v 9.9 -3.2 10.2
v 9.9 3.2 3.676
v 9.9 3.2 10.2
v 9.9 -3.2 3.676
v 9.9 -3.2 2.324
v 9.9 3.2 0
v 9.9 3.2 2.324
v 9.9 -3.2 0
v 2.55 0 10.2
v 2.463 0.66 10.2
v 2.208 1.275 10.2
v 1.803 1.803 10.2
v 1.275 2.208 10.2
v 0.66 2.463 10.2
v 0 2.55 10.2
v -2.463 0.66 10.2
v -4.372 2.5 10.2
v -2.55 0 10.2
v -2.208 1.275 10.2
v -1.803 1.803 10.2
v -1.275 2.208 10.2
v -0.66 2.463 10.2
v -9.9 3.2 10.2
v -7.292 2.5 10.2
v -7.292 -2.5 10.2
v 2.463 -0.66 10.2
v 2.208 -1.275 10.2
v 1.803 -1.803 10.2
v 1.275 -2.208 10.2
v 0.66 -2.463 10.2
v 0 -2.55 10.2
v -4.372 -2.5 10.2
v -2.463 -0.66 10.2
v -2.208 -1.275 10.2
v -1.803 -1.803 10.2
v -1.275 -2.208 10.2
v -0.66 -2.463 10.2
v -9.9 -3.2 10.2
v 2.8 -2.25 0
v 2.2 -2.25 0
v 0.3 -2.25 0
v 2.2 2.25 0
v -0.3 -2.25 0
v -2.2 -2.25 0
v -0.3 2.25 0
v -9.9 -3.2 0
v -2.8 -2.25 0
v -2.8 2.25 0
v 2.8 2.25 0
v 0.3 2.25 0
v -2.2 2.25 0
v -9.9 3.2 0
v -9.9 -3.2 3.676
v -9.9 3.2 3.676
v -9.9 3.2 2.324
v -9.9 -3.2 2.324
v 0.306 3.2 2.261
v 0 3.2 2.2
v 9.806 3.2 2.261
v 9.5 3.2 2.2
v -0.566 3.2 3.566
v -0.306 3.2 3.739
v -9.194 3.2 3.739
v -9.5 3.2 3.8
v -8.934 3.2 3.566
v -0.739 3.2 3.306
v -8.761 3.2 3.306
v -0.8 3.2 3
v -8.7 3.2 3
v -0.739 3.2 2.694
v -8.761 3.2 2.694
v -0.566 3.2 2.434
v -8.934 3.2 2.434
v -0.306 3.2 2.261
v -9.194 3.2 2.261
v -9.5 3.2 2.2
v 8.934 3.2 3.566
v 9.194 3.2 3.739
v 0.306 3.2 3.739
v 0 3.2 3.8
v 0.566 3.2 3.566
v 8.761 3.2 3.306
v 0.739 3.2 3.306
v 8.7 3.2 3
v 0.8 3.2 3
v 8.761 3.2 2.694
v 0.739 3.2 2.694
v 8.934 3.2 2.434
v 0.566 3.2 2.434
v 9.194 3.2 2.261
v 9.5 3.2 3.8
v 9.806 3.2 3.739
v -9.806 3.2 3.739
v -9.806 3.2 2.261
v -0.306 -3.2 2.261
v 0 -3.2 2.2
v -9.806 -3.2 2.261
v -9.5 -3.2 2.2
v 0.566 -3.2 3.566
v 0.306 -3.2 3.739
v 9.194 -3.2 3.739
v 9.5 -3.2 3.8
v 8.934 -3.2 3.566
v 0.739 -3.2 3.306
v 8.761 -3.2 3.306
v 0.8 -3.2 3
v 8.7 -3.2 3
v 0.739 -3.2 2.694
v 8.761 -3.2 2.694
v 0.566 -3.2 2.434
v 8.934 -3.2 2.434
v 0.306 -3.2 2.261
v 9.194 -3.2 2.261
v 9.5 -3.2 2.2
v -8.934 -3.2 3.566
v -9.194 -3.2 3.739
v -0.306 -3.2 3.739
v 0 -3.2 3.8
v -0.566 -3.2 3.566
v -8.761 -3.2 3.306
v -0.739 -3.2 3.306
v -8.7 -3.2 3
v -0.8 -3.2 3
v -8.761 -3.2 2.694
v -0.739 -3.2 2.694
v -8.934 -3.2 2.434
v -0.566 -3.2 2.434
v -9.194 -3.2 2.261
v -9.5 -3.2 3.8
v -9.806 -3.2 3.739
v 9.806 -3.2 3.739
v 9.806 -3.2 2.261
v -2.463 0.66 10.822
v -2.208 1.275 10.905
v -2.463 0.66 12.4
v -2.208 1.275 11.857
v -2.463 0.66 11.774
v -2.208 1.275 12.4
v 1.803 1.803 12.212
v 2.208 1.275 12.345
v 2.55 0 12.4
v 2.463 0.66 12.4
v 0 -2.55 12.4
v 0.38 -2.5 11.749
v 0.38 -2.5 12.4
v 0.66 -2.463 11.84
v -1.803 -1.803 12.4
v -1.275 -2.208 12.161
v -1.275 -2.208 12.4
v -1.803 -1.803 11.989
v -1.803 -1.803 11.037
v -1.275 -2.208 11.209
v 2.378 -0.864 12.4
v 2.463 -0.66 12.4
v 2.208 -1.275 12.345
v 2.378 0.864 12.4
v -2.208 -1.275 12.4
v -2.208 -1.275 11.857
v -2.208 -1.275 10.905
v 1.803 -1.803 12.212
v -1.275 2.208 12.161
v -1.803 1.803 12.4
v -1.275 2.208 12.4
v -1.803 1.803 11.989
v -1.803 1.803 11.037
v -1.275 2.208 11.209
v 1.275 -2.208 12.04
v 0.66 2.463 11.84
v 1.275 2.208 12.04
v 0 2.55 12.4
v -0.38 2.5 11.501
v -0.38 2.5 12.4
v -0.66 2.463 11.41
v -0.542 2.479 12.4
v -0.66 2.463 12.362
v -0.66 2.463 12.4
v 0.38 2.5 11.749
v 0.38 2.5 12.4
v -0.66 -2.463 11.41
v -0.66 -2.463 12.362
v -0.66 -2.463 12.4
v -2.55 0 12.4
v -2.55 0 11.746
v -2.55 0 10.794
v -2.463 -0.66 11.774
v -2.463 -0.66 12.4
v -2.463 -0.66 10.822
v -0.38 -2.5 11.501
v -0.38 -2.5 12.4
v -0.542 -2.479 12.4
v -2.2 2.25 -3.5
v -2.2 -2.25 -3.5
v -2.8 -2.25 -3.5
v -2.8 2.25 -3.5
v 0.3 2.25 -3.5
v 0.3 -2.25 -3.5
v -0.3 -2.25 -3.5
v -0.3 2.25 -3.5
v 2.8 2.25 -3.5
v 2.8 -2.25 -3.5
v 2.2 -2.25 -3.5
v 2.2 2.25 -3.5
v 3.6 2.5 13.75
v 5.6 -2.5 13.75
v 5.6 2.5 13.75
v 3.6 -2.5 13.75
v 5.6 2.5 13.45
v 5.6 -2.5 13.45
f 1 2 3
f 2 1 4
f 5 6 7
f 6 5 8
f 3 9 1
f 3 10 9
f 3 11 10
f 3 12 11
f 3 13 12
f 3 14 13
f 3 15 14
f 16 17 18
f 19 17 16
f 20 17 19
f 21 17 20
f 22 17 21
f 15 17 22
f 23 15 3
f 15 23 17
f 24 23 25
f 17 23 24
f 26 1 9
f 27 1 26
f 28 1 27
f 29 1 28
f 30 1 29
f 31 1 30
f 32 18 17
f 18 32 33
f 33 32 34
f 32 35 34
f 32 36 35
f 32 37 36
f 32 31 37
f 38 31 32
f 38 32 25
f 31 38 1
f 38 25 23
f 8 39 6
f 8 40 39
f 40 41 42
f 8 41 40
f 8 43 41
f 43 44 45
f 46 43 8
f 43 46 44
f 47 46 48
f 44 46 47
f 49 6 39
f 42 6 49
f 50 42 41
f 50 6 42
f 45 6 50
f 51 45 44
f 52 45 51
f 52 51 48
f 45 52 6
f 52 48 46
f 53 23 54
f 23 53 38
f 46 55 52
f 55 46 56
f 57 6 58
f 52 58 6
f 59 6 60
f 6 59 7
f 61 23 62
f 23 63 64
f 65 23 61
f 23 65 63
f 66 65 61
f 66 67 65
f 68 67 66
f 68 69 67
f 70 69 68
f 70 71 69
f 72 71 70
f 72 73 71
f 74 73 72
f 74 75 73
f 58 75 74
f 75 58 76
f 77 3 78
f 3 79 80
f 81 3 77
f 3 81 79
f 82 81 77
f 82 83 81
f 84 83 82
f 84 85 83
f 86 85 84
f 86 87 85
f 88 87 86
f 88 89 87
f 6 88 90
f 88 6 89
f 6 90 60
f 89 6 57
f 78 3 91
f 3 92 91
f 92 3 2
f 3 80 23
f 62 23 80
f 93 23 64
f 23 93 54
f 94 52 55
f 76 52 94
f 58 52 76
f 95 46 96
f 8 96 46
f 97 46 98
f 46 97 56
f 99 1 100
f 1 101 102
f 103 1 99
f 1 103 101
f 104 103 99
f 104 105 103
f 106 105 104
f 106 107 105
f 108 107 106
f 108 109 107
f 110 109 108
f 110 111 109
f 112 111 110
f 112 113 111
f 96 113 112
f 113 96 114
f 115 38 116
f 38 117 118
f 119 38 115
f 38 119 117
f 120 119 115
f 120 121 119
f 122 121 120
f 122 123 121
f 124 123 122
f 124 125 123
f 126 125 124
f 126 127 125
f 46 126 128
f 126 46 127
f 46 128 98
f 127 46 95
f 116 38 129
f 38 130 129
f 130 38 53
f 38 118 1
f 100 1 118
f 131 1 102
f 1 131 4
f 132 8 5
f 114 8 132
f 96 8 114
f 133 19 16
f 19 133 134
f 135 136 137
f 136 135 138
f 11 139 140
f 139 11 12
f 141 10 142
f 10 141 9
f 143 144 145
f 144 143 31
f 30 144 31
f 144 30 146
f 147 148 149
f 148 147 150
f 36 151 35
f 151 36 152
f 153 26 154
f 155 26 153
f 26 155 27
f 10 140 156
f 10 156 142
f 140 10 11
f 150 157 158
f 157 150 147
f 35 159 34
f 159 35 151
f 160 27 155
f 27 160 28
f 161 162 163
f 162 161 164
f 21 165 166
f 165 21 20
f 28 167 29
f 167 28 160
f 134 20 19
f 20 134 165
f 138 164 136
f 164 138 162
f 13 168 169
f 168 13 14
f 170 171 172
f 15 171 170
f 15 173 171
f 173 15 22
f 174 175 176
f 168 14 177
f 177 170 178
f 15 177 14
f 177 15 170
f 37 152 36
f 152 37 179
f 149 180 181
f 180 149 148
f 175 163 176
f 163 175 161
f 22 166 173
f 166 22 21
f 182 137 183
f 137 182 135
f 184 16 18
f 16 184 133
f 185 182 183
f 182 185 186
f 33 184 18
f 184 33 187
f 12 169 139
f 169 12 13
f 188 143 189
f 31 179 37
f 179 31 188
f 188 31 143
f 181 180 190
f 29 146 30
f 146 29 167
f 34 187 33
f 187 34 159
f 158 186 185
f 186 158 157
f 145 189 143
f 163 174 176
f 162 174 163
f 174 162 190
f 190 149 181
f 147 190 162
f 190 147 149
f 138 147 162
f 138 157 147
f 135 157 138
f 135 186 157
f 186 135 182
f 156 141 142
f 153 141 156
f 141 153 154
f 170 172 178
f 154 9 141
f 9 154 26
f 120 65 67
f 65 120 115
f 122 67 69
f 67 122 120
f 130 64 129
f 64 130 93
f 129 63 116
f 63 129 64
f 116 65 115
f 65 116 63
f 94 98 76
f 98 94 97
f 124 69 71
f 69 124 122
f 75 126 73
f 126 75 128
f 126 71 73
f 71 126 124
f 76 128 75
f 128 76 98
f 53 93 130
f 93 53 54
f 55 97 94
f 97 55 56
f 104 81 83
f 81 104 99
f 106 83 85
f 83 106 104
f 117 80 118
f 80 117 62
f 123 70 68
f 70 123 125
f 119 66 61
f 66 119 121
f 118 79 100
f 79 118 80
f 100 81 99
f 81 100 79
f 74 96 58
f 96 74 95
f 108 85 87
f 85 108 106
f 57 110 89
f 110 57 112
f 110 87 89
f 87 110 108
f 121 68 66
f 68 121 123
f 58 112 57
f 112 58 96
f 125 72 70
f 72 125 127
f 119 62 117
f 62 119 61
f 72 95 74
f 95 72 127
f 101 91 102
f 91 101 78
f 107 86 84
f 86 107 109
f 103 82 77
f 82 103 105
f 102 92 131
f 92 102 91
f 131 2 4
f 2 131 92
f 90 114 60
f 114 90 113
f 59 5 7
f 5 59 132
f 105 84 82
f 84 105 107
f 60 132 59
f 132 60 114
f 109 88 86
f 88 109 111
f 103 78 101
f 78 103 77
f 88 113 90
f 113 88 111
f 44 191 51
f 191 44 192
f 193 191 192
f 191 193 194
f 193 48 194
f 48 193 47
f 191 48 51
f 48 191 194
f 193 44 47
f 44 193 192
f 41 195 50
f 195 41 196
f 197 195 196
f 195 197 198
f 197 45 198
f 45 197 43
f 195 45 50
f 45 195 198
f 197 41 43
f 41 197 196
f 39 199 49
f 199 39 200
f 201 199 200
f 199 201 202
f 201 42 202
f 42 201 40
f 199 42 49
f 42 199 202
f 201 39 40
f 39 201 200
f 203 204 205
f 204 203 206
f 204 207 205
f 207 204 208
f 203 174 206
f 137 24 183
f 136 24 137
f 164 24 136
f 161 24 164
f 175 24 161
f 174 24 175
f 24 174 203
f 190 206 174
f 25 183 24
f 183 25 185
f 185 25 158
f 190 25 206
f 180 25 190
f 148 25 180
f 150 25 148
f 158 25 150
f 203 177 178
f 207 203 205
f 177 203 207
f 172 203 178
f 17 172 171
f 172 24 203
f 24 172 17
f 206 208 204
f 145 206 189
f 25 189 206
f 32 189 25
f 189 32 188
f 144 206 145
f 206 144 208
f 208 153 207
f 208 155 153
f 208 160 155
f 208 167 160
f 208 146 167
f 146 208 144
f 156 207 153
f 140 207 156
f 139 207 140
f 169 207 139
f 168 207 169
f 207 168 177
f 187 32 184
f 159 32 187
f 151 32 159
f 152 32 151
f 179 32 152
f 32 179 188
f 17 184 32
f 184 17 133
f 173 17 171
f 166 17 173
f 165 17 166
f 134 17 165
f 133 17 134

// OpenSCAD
// Bumper / Tower Micro Switch — SS-5GL-class SPDT snap-action switch
// ===========================================================================
//
// Parametric clearance/interfacing model of the subminiature SPDT snap-action
// micro switch used as the OOMWOO LiDAR-tower bumper sensor and front-bumper
// contact sensor.
//
// BOM identity (verify against the actual unit before relying on fit):
//   BOM.md row "LiDAR tower bumper sensor | 4 | $0.70 | Micro switches | SPDT
//   or similar" and row "Bumper switches | 2 | $0 | Included in cliff sensors
//   bundle". The BOM does NOT name a part number; the class of part is a
//   subminiature SPDT snap-action switch with lever actuator.
//
// Dimension basis: OMRON SS series datasheet "en-ss.pdf" (fetched 2026-08-09,
// https://omronfs.omron.com/en_US/ecb/products/pdf/en-ss.pdf), page 5, the
// "Hinge lever" outline drawing and operating-characteristics table (SS-5GL).
// The SS-5 family is THE widely used subminiature snap-action switch form
// factor (identical to the common 3D-printer end-stop switches) and is the
// representative geometry for this BOM class. Marked (datasheet:) means read
// from that drawing; marked (estimate) means inferred. The $0.70 AliExpress
// part is NOT guaranteed to be an Omron — caliper-verify against MEASURE-ME.md
// §15 before finalizing any mount.
//
// Cross-axis convention: switch body length runs along X, width along Y,
// height along Z. Origin at bottom-centre of the switch body, plunger side up.
//
// STATUS: DRAFT — datasheet-grounded envelope, caliper verification required.
//
// License: CC BY-SA 4.0

$fn = 48;

/* [Dimensions — EDIT TO MATCH YOUR MEASURED PART] */

// --- Body envelope (datasheet: en-ss.pdf p.5 hinge-lever outline) ---
// Overall body length / width / height.
body_l = 19.8;   // (datasheet: 19.8 dimension on hinge-lever outline)
body_w =  6.4;   // (datasheet: 6.4 dimensions on outline)
body_h = 10.2;   // (datasheet: 10.2 dimension on outline; incl. plunger guide)

// --- Mounting holes ---
// Datasheet drawing shows through-holes in the body for M1.6-class screws.
// Text on drawing: "3-1.6 dia. holes" with a "9.5±0.1" spacing callout.
// NOTE: hole pattern needs caliper verification — the drawing text extraction
// is ambiguous about which radius applies where (1.6 vs 2.35 callouts).
mtg_hole_dia   = 1.6;   // (datasheet: "3-1.6 dia. holes")
mtg_hole_count = 3;     // (datasheet: "3-1.6 dia. holes")
mtg_hole_pitch = 9.5;   // (datasheet: "9.5±0.1" spacing callout on outline)
mtg_hole_z     = 3.0;   // (estimate) hole axis height above mounting face

// --- Plunger / actuator ---
// Centre plunger that the lever presses on. (datasheet: "2.5±0.07 dia." on
// drawing = plunger OD at top of body).
plunger_dia  = 2.5;    // (datasheet: "2.5±0.07 dia.")
plunger_travel = 0.6;  // (estimate) class-of-part pretravel; datasheet SS-5GL
                       // OT min 1.0mm, MD max; plunger stroke is small

// --- Lever (hinge lever, SS-5GL style) ---
// The datasheet hinge-lever outline shows a stainless-steel leaf lever
// ("t=0.3*  * Stainless-steel lever") mounted at one end of the body top.
lever_style     = 1;   // 0 = no lever (pin plunger), 1 = hinge lever
lever_mat_t     = 0.3; // (datasheet: "t=0.3" lever sheet thickness)
lever_w         = 5.0; // (estimate) lever width; sheet narrower than body
lever_reach     = 14.5;// (datasheet: 14.5 lever reach dimension on outline)
// Free position = lever tip rest height above mounting reference plane.
// (datasheet operating characteristics: SS-5GL FP max 13.6 mm, OP 8.8±0.8 mm;
// used for tower/bumper clearance design).
lever_fp_z      = 13.6;  // (datasheet: SS-5GL "FP Max." = 13.6 mm)
lever_op_z      =  8.8;  // (datasheet: SS-5GL "OP" = 8.8±0.8 mm)
// Hinge pivot height above body base.
lever_hinge_z   = body_h - 1.0; // (estimate)

// --- Terminals (solder terminals, SPDT: C / NO / NC) ---
// Datasheet outline labels the three terminals C, NO, NC. Pin geometry is not
// dimensioned in the fetched section -> estimate, caliper verify.
term_count   = 3;      // (datasheet: C / NO / NC labels on outline)
term_pitch   = 2.5;    // (estimate) pin-to-pin pitch
term_len     = 3.5;    // (estimate) length below body base
term_w       = 0.6;    // (estimate) pin thickness
term_depth   = 4.5;    // (estimate) pin depth into body (Y direction)

// --- Render controls ---
show_terminals = true;  // set false to hide pins (clearer mount test)

// ===== MODULES =====

// Solid body block (no holes)
module solid_body() {
    translate([-body_l/2, -body_w/2, 0])
        cube([body_l, body_w, body_h]);
    // Plunger-guide boss around the plunger on top face
    translate([0, 0, body_h])
        cylinder(d=plunger_dia + 2.6, h=2.2, $fn=24);
}

// Mounting through-holes (drilled laterally through the width)
module mounting_holes() {
    first = -(mtg_hole_count - 1) * mtg_hole_pitch / 2;
    for (i = [0 : mtg_hole_count - 1]) {
        translate([first + i * mtg_hole_pitch, 0, mtg_hole_z])
            rotate([90, 0, 0])
                cylinder(d=mtg_hole_dia, h=body_w + 2, center=true, $fn=16);
    }
}

module plunger() {
    translate([0, 0, body_h])
        cylinder(d=plunger_dia, h=plunger_travel + 1.0, $fn=24);
}

module lever() {
    if (lever_style == 1) {
        // Simplified flat hinge-lever leaf: hinge at the -X end of the body
        // top, lever tip reaching forward to +X at free-position height.
        // Real part is a formed stainless sheet; this is a clearance envelope.
        hull() {
            translate([-body_l/2 + 1.0, 0, lever_hinge_z])
                cube([2.0, lever_w, lever_mat_t], center=true);
            translate([-body_l/2 + lever_reach, 0, lever_fp_z])
                cube([2.0, lever_w, lever_mat_t], center=true);
        }
    }
}

module terminals() {
    if (show_terminals) {
        first = -(term_count - 1) * term_pitch / 2;
        for (i = [0 : term_count - 1]) {
            translate([first + i * term_pitch, 0, -term_len/2])
                cube([term_w, term_depth, term_len], center=true);
        }
    }
}

// ===== ASSEMBLY =====
color("DimGray") difference() {
    solid_body();
    mounting_holes();
}
color("Silver") lever();
color("Gold")   plunger();
color("DarkOrange") terminals();
